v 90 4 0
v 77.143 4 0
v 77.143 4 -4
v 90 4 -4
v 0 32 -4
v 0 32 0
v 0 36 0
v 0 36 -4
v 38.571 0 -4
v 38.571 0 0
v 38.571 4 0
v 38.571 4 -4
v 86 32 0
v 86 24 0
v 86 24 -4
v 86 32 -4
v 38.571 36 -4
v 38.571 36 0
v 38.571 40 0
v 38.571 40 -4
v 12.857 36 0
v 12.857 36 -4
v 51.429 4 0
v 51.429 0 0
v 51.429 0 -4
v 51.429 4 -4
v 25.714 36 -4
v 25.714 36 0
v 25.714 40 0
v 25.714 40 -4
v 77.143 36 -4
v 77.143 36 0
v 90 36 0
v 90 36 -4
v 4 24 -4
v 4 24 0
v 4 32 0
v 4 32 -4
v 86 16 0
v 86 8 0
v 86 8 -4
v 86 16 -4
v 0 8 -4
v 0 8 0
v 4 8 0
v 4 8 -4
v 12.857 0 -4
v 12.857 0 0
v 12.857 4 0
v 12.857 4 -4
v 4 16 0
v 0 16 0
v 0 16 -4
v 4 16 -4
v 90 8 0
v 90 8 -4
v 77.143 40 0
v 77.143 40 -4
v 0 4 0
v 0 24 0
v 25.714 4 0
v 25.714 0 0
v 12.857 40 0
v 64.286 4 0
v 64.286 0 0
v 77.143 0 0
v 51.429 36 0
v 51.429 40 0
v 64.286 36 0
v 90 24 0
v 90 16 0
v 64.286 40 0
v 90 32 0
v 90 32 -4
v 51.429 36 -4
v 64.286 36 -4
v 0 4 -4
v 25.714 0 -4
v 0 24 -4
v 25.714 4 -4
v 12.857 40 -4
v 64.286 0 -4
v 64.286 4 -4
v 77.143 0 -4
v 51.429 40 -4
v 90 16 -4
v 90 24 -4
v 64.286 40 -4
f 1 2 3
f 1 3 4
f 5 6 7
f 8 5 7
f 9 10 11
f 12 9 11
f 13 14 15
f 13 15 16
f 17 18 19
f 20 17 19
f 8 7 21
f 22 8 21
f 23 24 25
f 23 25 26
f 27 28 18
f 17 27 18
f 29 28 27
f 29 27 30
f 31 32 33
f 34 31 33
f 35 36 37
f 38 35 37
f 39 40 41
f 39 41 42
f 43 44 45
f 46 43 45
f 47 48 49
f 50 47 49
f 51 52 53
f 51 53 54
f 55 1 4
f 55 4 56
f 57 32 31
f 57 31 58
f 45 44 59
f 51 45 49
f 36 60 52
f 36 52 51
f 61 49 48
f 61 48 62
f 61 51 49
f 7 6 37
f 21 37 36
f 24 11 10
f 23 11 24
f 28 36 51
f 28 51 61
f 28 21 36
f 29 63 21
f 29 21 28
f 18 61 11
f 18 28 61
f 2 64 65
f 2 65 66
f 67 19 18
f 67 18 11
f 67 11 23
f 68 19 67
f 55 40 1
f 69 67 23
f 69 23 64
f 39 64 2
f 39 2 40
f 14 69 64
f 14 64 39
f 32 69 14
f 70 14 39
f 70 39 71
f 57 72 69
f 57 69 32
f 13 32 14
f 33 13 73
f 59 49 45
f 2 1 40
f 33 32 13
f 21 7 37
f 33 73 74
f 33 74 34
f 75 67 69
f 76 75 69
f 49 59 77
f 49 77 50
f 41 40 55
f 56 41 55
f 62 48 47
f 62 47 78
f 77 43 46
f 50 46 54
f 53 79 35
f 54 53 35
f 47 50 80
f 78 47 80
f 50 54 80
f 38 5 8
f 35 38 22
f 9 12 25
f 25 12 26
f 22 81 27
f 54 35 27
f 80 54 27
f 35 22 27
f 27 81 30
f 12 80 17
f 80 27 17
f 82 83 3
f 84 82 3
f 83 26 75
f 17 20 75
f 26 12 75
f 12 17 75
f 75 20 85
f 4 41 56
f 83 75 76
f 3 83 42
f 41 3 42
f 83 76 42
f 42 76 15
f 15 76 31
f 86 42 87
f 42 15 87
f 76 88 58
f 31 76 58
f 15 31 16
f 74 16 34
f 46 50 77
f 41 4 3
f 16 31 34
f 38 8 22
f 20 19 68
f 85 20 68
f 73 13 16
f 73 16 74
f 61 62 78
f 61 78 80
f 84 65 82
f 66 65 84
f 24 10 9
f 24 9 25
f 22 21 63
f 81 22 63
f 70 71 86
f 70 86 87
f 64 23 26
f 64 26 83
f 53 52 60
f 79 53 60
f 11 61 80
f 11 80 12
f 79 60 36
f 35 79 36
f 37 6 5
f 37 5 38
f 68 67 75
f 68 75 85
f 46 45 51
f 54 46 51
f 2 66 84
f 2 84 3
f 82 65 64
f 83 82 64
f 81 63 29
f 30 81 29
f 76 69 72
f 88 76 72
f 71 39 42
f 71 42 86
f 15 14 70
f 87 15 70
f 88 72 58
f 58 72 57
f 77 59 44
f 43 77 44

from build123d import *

# Parameters (mm, degrees)
BUITENAFMETING_RECHTHOEK_W  = 90
BUITENAFMETING_RECHTHOEK_H  = 40
PLAAT_DEPTH                 = 4
TAND_HOR_W                  = 12.857142857
TAND_HOR_H                  = 4
TAND_BOVEN_DEPTH            = 5
TANDEN_PATROON_BOVEN_COUNT  = 4
TANDEN_PATROON_BOVEN_PITCH  = 25.714285714
TAND_VER_W                  = 4
TAND_VER_H                  = 8
TAND_LINKS_DEPTH            = 5
TANDEN_PATROON_LINKS_COUNT  = 2
TANDEN_PATROON_LINKS_PITCH  = 16
TAND_O_W                    = 12.857142857
TAND_O_H                    = 4
TAND_ONDER_DEPTH            = 5
TANDEN_PATROON_ONDER_COUNT  = 4
TANDEN_PATROON_ONDER_PITCH  = 25.714285714
TAND_R_W                    = 4
TAND_R_H                    = 8
TAND_RECHTS_DEPTH           = 5
TANDEN_PATROON_RECHTS_COUNT = 2
TANDEN_PATROON_RECHTS_PITCH = 16


with BuildPart() as part:
    # Buitenafmeting Rechthoek → Plaat (new body)
    with BuildSketch(Plane.XY):
        with Locations((45, 20)):
            Rectangle(BUITENAFMETING_RECHTHOEK_W, BUITENAFMETING_RECHTHOEK_H)
    extrude(amount=-PLAAT_DEPTH)

    # Tand Hor → Tand Boven (cut, through all)
    with BuildSketch(Plane.XY):
        with Locations((6.428571429, 38)):
            Rectangle(TAND_HOR_W, TAND_HOR_H)
    tand_boven = extrude(amount=-TAND_BOVEN_DEPTH, mode=Mode.SUBTRACT)

    # Tanden Patroon Boven: Tand Boven ×4
    with Locations(*[(i * TANDEN_PATROON_BOVEN_PITCH, 0, 0) for i in range(1, TANDEN_PATROON_BOVEN_COUNT)]):
        add(tand_boven, mode=Mode.SUBTRACT)

    # Tand Ver → Tand Links (cut, through all)
    with BuildSketch(Plane.XY):
        with Locations((2, 28)):
            Rectangle(TAND_VER_W, TAND_VER_H)
    tand_links = extrude(amount=-TAND_LINKS_DEPTH, mode=Mode.SUBTRACT)

    # Tanden Patroon Links: Tand Links ×2
    with Locations(*[(0, -i * TANDEN_PATROON_LINKS_PITCH, 0) for i in range(1, TANDEN_PATROON_LINKS_COUNT)]):
        add(tand_links, mode=Mode.SUBTRACT)

    # Tand O → Tand Onder (cut, through all)
    with BuildSketch(Plane.XY):
        with Locations((6.428571429, 2)):
            Rectangle(TAND_O_W, TAND_O_H)
    tand_onder = extrude(amount=-TAND_ONDER_DEPTH, mode=Mode.SUBTRACT)

    # Tanden Patroon Onder: Tand Onder ×4
    with Locations(*[(i * TANDEN_PATROON_ONDER_PITCH, 0, 0) for i in range(1, TANDEN_PATROON_ONDER_COUNT)]):
        add(tand_onder, mode=Mode.SUBTRACT)

    # Tand R → Tand Rechts (cut, through all)
    with BuildSketch(Plane.XY):
        with Locations((88, 28)):
            Rectangle(TAND_R_W, TAND_R_H)
    tand_rechts = extrude(amount=-TAND_RECHTS_DEPTH, mode=Mode.SUBTRACT)

    # Tanden Patroon Rechts: Tand Rechts ×2
    with Locations(*[(0, -i * TANDEN_PATROON_RECHTS_PITCH, 0) for i in range(1, TANDEN_PATROON_RECHTS_COUNT)]):
        add(tand_rechts, mode=Mode.SUBTRACT)


solid = part.part
